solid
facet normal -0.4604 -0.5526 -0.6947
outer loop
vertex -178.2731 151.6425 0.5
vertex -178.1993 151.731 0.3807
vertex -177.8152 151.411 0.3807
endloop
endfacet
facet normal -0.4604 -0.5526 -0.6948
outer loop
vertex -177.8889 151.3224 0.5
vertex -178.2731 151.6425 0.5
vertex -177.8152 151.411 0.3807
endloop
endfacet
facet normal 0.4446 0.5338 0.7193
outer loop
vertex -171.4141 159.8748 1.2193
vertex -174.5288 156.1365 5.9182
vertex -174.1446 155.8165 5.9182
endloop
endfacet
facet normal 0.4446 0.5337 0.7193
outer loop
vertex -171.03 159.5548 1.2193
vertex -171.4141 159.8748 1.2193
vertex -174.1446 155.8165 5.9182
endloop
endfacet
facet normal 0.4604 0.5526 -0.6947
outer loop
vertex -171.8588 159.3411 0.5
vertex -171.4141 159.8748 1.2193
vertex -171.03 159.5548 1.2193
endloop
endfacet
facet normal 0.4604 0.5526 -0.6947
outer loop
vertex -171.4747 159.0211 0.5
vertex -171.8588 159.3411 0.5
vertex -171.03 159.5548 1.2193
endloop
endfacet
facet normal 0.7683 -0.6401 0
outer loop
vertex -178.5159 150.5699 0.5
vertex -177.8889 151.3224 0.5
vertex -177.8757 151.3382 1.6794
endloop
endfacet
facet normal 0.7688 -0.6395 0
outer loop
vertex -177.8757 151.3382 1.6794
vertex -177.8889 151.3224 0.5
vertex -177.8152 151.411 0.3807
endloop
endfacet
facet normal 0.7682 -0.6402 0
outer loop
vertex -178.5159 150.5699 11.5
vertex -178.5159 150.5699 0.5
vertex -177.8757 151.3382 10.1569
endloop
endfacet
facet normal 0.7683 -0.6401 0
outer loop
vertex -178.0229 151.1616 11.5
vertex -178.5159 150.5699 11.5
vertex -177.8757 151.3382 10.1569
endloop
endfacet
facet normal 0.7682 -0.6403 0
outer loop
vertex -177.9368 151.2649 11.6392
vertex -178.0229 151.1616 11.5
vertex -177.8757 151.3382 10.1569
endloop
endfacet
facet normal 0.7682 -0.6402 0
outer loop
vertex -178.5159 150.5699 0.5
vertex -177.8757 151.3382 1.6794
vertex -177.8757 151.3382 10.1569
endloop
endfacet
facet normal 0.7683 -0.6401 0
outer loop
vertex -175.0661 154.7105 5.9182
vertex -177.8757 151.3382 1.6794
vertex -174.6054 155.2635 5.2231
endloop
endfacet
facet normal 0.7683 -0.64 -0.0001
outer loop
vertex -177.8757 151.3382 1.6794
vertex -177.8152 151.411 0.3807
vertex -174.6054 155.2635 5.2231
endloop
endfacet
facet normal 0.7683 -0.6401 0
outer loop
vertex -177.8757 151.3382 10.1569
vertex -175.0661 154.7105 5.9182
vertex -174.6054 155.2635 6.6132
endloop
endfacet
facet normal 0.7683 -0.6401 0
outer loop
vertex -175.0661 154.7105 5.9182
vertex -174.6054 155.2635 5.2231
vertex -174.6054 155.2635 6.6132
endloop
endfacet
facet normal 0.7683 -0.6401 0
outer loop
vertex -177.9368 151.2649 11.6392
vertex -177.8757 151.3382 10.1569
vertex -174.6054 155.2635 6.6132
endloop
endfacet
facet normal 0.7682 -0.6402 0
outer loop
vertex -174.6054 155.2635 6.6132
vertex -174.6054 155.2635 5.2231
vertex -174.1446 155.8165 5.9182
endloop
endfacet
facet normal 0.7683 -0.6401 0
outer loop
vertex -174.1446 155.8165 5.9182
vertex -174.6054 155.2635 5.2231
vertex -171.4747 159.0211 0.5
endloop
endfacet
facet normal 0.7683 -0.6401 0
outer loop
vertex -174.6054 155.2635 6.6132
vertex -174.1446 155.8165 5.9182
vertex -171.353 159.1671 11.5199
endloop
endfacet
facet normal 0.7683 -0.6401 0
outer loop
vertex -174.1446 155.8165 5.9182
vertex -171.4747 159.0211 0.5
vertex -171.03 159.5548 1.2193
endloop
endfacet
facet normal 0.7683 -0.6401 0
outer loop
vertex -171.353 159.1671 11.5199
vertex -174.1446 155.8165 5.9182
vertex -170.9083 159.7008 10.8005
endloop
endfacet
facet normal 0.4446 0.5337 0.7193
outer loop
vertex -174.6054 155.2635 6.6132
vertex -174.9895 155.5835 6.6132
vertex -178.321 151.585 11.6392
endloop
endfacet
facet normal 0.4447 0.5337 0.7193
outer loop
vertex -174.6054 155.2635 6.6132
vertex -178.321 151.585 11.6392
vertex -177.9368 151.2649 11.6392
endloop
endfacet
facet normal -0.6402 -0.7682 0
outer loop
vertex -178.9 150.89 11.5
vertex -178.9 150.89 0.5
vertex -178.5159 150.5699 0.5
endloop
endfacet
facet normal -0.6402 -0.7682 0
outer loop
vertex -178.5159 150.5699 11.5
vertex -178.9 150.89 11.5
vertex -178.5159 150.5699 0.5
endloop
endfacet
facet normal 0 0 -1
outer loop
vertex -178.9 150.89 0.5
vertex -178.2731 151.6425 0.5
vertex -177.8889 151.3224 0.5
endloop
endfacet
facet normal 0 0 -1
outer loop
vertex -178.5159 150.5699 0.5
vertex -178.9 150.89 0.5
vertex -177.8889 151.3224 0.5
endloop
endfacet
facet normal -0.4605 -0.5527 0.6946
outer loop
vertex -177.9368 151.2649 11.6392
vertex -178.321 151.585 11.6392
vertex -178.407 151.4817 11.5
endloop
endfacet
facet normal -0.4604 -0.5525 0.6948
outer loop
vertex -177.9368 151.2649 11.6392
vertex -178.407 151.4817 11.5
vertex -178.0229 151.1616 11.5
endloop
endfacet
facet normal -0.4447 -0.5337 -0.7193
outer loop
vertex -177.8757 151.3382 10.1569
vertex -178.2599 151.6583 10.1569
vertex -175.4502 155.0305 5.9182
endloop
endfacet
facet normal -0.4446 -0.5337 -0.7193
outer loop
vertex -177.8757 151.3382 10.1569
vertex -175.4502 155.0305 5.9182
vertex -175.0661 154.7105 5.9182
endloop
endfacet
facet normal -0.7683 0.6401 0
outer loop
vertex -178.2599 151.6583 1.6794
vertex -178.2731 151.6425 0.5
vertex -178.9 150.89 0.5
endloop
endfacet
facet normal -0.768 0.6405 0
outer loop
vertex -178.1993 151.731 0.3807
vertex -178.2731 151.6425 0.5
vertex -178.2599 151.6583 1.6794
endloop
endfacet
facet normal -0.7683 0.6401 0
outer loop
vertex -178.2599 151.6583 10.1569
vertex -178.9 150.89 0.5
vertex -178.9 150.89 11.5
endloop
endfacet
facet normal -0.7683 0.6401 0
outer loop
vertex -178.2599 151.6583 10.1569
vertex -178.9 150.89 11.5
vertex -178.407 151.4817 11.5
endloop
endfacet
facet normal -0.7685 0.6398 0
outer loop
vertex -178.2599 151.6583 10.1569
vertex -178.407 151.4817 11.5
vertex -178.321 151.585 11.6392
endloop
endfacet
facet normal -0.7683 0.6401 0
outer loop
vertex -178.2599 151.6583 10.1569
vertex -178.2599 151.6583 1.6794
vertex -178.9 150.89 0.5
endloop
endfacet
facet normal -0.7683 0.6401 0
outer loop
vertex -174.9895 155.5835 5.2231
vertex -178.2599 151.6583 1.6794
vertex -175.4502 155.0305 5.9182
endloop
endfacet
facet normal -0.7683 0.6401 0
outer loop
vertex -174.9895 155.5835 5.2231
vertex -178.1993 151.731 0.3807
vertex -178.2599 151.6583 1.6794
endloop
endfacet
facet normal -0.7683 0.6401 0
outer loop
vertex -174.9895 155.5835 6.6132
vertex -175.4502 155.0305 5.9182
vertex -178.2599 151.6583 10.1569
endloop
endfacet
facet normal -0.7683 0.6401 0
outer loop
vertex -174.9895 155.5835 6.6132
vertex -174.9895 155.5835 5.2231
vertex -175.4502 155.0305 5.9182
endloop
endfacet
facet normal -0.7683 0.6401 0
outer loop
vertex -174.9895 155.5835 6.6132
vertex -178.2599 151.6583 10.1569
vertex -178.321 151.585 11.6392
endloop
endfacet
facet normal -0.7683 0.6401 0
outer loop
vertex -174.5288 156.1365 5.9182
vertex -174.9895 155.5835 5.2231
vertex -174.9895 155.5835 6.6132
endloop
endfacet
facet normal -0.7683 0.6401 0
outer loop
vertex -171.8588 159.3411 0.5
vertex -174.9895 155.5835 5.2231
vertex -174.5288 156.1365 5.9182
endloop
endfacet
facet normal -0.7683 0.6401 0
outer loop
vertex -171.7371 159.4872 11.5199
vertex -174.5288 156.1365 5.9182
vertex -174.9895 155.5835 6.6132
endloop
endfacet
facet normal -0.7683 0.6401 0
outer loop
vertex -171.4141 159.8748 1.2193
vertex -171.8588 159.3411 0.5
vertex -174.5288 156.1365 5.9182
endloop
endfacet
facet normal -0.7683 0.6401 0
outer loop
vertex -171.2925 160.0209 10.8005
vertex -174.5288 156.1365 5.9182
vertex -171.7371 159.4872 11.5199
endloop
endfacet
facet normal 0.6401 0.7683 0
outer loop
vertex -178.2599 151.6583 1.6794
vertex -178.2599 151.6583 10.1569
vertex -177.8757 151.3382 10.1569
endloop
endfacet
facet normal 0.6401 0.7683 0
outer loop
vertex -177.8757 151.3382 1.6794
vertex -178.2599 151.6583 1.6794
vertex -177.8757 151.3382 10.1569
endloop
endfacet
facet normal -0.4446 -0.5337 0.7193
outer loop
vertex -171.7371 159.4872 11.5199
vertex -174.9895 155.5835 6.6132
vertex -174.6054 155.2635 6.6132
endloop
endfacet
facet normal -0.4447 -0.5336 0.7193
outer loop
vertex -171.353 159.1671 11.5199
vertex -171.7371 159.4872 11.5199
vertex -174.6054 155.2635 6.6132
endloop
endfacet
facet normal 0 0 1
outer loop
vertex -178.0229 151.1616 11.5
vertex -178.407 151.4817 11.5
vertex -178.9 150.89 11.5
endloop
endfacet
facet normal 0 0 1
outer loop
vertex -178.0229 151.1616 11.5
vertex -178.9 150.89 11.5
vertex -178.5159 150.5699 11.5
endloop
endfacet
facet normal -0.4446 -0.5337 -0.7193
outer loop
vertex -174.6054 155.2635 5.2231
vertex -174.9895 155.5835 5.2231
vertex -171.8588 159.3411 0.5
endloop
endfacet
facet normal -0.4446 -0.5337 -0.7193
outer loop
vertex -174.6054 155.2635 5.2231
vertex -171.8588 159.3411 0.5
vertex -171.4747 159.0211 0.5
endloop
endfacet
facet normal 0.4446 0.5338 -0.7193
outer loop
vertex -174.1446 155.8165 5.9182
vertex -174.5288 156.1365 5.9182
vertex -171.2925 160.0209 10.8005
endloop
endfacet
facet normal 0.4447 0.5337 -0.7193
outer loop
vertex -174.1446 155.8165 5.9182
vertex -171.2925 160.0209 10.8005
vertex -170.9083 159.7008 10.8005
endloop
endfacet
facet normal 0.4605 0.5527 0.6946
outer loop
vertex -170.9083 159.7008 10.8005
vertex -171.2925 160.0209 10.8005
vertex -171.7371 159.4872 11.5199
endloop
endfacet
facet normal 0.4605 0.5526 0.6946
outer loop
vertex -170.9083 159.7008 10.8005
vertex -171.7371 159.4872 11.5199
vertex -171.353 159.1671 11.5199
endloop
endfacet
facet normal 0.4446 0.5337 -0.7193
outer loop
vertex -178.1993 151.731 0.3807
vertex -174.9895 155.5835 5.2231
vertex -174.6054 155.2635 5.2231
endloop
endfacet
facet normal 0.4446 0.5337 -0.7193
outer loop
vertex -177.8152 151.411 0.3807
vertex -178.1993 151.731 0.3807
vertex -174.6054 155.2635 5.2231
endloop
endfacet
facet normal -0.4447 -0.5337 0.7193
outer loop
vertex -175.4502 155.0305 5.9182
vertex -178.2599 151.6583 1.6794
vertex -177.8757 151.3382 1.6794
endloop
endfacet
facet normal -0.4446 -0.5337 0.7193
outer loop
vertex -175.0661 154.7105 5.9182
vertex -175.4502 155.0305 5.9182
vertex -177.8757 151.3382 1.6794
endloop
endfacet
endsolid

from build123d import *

# Parameters (mm, degrees)
BOX238_W                  = 0.5
BOX238_H                  = 1
BOX238_DEPTH              = 15
BOX238_ROLL_ANGLE         = 46
BOX239_W                  = 0.5
BOX239_H                  = 1
BOX239_DEPTH              = 15
BOX239_ROLL_ANGLE         = -46
BOX237_W                  = 0.5
BOX237_H                  = 1
BOX237_DEPTH              = 11
FUSION022_PLACEMENT_ANGLE = -39.8


with BuildPart() as cubo238:
    # Box238 → Box238 (new body)
    with BuildSketch(Plane.XY):
        with Locations((0.25, 0.5)):
            Rectangle(BOX238_W, BOX238_H)
    extrude(amount=BOX238_DEPTH)


with BuildPart() as cubo238_1:
    # Box238 roll: moved
    add(cubo238.part.rotate(Axis((0, 0, 0), (1, 0, 0)), BOX238_ROLL_ANGLE))


with BuildPart() as cubo238_2:
    # Box238 placement: moved
    add(cubo238_1.part.moved(Location((0, 11, 0.5))))


with BuildPart() as cubo239:
    # Box239 → Box239 (new body)
    with BuildSketch(Plane.XY):
        with Locations((0.25, 0.5)):
            Rectangle(BOX239_W, BOX239_H)
    extrude(amount=BOX239_DEPTH)


with BuildPart() as cubo239_1:
    # Box239 roll: moved
    add(cubo239.part.rotate(Axis((0, 0, 0), (1, 0, 0)), BOX239_ROLL_ANGLE))


with BuildPart() as cubo239_2:
    # Box239 placement: moved
    add(cubo239_1.part.moved(Location((0, 0.4, 1.1))))


with BuildPart() as fusion022:
    # Box237 → Box237 (new body)
    with BuildSketch(Plane.XY.offset(0.5)):
        with Locations((0.25, 0.5)):
            Rectangle(BOX237_W, BOX237_H)
    extrude(amount=BOX237_DEPTH)

    # Fusion022: union Cubo238, Cubo239
    add(cubo238_2.part)
    add(cubo239_2.part)


with BuildPart() as fusion022_1:
    # Fusion022 placement: moved
    add(fusion022.part.moved(Location((-178.9, 150.89, 0))).rotate(Axis((-178.9, 150.89, 0), (0, 0, 1)), FUSION022_PLACEMENT_ANGLE))


solid = fusion022_1.part
